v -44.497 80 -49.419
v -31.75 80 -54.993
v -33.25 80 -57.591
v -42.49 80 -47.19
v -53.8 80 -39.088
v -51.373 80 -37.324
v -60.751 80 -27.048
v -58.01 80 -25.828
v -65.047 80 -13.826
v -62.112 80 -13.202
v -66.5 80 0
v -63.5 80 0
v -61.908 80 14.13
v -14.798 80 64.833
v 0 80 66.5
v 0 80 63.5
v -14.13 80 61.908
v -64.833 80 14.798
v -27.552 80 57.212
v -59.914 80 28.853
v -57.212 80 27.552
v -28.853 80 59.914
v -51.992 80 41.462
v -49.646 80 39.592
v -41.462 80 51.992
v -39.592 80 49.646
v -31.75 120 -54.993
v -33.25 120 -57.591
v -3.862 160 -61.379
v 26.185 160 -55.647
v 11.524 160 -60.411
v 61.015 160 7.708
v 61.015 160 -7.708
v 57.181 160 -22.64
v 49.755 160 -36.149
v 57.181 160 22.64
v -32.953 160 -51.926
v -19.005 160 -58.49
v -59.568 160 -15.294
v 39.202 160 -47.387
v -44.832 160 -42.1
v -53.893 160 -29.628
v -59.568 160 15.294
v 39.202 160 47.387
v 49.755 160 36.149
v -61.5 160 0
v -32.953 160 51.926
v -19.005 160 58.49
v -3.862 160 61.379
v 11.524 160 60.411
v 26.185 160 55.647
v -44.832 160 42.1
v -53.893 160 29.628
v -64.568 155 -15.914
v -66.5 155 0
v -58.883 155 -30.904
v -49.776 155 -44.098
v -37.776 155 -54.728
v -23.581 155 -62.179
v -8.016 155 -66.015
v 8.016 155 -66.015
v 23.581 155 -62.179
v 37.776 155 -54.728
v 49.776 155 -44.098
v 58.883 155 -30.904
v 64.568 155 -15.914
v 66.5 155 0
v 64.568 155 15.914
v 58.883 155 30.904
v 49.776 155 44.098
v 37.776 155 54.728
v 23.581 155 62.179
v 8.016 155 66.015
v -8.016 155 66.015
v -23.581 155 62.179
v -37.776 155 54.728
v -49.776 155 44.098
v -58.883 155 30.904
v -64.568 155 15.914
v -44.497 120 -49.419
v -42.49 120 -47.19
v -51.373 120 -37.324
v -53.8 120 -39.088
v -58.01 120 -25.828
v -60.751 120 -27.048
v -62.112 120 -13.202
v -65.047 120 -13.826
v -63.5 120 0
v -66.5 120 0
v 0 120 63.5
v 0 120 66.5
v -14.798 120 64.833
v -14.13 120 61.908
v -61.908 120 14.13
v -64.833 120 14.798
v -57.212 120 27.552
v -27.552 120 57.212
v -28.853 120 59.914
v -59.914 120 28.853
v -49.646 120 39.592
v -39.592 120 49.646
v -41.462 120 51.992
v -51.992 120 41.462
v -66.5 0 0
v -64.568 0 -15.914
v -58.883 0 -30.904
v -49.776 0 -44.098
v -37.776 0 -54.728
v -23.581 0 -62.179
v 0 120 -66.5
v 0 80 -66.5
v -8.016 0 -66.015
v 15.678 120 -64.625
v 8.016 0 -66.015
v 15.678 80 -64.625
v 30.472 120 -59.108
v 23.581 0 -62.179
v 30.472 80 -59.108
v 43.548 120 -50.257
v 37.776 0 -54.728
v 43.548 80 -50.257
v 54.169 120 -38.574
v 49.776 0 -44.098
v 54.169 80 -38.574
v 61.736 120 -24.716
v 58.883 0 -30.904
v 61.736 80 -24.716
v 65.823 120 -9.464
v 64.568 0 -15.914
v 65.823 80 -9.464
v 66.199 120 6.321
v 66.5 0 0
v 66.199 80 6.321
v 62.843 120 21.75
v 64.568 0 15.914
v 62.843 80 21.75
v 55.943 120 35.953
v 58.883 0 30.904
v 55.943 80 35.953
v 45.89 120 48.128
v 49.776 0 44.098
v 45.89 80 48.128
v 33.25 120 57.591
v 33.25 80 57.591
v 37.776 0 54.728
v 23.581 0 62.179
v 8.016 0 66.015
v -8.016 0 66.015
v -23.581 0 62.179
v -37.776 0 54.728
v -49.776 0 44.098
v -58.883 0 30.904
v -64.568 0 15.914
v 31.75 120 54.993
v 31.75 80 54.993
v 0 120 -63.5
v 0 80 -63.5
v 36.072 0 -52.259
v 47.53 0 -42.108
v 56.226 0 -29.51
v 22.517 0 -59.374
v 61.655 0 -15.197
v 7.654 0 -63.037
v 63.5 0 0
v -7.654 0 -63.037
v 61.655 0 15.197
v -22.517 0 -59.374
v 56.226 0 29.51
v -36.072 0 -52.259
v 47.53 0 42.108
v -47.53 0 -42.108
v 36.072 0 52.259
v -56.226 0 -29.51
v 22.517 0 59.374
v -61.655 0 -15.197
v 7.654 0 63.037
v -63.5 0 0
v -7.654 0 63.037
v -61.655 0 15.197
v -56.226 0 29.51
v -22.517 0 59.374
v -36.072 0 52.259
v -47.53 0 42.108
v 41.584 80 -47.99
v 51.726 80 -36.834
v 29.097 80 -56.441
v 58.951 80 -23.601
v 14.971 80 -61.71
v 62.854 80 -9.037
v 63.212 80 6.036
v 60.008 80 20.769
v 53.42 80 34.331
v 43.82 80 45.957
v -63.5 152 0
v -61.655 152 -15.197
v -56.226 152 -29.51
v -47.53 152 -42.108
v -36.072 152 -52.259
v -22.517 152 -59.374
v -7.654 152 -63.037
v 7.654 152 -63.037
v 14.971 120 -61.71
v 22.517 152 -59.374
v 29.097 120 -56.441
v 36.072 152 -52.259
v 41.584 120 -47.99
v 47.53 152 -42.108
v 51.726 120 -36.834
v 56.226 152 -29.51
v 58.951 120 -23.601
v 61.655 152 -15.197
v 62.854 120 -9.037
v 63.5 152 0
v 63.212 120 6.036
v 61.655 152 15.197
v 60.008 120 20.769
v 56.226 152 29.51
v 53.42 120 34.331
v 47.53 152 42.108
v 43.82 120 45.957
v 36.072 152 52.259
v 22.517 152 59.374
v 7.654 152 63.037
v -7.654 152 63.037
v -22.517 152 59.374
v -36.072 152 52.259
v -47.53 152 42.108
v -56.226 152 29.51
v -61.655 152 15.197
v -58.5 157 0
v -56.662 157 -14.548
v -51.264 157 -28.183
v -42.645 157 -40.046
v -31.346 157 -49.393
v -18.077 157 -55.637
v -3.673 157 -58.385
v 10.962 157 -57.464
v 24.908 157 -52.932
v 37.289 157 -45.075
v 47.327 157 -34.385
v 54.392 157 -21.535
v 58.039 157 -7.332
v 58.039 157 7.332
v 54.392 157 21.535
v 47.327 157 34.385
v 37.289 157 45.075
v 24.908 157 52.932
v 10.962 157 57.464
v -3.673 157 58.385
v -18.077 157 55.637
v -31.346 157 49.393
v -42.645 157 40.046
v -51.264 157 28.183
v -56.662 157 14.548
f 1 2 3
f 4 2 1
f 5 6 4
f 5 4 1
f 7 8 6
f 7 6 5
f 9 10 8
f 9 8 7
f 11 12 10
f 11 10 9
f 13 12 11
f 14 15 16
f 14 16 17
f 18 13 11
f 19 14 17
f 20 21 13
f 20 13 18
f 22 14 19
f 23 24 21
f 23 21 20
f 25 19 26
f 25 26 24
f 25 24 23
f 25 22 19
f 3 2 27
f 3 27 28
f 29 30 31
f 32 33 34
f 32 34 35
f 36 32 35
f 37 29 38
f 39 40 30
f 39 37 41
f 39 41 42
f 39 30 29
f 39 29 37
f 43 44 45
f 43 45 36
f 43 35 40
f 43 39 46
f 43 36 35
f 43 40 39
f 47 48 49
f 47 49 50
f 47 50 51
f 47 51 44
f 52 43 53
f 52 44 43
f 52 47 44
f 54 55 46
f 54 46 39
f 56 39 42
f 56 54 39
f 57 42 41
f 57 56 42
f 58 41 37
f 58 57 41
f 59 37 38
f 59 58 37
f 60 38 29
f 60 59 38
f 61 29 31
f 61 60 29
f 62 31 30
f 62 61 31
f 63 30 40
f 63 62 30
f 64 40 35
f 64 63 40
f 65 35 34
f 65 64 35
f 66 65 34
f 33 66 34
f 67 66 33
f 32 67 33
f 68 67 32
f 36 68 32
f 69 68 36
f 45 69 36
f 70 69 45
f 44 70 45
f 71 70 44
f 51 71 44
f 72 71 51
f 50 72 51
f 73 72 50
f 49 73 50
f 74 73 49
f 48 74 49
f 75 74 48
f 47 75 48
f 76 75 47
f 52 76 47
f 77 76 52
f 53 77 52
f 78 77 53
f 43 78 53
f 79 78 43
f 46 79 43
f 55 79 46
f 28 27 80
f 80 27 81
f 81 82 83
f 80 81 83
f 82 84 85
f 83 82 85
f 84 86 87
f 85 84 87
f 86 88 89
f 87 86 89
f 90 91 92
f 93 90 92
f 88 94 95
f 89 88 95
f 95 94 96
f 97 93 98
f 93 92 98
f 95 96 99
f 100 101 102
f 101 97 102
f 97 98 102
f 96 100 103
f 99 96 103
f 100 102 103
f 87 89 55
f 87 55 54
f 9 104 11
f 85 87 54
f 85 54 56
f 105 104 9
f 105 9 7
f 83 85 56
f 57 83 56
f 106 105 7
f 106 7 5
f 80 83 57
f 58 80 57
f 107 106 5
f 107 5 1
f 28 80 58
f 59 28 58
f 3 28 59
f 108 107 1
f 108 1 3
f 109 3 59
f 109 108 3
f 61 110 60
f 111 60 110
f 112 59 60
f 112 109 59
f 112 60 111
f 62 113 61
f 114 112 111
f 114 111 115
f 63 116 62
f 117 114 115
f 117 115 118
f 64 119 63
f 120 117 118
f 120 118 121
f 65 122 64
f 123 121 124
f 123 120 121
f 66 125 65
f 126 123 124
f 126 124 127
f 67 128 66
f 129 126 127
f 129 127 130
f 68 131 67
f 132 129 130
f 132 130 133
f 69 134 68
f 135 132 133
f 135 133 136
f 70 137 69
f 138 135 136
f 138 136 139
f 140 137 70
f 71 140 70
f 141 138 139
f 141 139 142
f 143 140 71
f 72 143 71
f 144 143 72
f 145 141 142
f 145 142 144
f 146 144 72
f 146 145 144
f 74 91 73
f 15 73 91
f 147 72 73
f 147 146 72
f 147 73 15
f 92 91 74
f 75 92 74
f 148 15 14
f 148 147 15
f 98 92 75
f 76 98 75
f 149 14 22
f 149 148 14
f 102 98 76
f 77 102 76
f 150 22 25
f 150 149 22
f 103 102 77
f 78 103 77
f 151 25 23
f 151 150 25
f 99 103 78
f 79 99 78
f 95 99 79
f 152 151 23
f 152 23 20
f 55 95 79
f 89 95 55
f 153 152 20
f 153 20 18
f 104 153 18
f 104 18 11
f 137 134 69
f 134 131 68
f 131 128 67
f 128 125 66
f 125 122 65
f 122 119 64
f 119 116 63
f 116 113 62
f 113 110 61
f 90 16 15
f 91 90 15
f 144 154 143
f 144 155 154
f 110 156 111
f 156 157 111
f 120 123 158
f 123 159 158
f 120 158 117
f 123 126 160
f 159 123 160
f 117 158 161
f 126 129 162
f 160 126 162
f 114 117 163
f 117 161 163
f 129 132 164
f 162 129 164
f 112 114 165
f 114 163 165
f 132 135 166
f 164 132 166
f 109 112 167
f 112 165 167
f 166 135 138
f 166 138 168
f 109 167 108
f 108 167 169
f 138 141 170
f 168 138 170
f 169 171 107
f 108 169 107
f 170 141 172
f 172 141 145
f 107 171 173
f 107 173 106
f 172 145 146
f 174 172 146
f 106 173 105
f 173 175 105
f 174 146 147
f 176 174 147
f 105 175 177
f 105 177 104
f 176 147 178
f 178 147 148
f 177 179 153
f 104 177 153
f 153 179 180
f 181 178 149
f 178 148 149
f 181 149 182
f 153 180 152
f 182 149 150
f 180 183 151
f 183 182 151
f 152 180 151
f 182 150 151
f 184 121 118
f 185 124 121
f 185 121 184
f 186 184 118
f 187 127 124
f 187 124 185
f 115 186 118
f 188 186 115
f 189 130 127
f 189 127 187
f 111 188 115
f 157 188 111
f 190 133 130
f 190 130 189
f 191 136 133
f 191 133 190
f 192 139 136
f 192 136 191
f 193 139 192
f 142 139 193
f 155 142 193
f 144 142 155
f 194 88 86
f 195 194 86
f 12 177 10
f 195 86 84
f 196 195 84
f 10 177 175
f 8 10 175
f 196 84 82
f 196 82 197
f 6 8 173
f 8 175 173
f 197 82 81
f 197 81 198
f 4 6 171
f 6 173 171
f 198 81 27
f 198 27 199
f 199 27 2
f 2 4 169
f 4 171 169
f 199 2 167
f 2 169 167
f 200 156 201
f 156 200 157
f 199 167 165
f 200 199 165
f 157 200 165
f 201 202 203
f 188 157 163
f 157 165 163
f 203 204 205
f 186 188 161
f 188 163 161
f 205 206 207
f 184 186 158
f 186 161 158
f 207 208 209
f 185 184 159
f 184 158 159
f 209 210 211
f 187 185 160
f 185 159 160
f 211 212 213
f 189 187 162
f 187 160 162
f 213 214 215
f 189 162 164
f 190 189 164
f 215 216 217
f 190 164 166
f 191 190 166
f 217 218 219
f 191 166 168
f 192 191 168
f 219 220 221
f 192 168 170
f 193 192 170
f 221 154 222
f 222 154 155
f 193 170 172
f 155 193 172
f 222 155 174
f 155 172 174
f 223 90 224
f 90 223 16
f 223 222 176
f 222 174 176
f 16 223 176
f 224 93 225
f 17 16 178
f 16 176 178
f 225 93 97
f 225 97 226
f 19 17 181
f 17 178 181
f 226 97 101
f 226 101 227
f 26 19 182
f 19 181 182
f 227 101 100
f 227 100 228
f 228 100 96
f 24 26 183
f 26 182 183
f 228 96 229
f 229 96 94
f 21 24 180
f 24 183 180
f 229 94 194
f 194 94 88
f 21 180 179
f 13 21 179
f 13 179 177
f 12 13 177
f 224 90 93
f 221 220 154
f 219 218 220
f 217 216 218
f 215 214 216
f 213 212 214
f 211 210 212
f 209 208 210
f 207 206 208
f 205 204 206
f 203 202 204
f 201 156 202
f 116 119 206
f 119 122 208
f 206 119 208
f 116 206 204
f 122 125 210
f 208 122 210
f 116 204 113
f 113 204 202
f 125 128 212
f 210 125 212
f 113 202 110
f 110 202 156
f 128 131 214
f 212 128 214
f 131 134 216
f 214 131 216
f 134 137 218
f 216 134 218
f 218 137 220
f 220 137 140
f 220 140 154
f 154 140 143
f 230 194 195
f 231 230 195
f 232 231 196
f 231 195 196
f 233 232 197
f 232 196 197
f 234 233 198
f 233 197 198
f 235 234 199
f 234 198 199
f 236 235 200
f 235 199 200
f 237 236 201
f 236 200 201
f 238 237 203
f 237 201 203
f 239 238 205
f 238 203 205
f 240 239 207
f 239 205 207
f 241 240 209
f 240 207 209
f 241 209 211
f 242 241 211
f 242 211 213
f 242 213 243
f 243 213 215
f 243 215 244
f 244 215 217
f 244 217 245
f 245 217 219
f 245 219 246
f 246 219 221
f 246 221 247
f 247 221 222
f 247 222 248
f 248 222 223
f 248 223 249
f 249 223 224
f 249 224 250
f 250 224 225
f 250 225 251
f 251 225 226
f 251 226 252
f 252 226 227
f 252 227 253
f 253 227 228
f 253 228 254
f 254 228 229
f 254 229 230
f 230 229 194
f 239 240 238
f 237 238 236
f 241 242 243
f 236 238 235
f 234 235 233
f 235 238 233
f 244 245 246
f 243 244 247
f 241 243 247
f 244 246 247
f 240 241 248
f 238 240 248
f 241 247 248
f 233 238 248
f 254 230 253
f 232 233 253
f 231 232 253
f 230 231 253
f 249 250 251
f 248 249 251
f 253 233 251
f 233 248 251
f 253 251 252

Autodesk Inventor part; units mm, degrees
ref_plane "YZ Plane" through (0, 0, 0) normal (1, 0, 0) x (0, 1, 0)
sketch "Sketch1" plane through (0, 0, 0) normal (0, 1, 0) x (-1, 0, 0)
  circle A0 centre (0, 0) radius 63.5
  circle A1 centre (0, 0) radius 66.5
  dimension "d0" = 127
  dimension "d1" = 133
extrude "Extrusion1" add sketch "Sketch1" along normal blind 160
ref_plane "Work Plane1" through (0, 160, 0) normal (0, 1, 0) x (-1, 0, 0)
sketch "Sketch2" plane through (0, 160, 0) normal (0, 1, 0) x (-1, 0, 0)
  circle A0 centre (0, 0) radius 63.5
  dimension "d5" = 127
extrude "Extrusion2" add sketch "Sketch2" against normal blind 3
chamfer "Chamfer1" distance 5 angle 45 1 edges at (66.5, 160, 0)
chamfer "Chamfer2" distance 5 angle 45 1 edges at (63.5, 157, 0)
ref_plane "Work Plane2" through (0, 80, 0) normal (0, 1, 0) x (-1, 0, 0)
sketch "Sketch3" plane through (0, 80, 0) normal (0, 1, 0) x (-1, 0, 0)
  circle A0 centre (0, 0) radius 63.5
  circle A1 centre (0, 0) radius 66.5
  line L0 (0, 0) -> (0, -66.5)
  line L1 (0, 0) -> (33.25, -57.5907)
  line L2 (0, 0) -> (66.5, 0) construction
  line L3 (0, 0) -> (0, 66.5)
  line L4 (0, 0) -> (-33.25, 57.5907)
  point P0 (0, 63.5)
  point P1 (31.75, -54.9926)
  point P2 (-31.75, 54.9926)
  point P3 (0, -63.5)
  dimension "d15" = 127
  dimension "d16" = 133
  dimension "d17" = 60
extrude "Extrusion3" cut sketch "Sketch3" along normal blind 40 contours A0 L3 A1 L1 | A0 L0 A1 L4
properties part number "siren_new" material "ABS Plastic"
